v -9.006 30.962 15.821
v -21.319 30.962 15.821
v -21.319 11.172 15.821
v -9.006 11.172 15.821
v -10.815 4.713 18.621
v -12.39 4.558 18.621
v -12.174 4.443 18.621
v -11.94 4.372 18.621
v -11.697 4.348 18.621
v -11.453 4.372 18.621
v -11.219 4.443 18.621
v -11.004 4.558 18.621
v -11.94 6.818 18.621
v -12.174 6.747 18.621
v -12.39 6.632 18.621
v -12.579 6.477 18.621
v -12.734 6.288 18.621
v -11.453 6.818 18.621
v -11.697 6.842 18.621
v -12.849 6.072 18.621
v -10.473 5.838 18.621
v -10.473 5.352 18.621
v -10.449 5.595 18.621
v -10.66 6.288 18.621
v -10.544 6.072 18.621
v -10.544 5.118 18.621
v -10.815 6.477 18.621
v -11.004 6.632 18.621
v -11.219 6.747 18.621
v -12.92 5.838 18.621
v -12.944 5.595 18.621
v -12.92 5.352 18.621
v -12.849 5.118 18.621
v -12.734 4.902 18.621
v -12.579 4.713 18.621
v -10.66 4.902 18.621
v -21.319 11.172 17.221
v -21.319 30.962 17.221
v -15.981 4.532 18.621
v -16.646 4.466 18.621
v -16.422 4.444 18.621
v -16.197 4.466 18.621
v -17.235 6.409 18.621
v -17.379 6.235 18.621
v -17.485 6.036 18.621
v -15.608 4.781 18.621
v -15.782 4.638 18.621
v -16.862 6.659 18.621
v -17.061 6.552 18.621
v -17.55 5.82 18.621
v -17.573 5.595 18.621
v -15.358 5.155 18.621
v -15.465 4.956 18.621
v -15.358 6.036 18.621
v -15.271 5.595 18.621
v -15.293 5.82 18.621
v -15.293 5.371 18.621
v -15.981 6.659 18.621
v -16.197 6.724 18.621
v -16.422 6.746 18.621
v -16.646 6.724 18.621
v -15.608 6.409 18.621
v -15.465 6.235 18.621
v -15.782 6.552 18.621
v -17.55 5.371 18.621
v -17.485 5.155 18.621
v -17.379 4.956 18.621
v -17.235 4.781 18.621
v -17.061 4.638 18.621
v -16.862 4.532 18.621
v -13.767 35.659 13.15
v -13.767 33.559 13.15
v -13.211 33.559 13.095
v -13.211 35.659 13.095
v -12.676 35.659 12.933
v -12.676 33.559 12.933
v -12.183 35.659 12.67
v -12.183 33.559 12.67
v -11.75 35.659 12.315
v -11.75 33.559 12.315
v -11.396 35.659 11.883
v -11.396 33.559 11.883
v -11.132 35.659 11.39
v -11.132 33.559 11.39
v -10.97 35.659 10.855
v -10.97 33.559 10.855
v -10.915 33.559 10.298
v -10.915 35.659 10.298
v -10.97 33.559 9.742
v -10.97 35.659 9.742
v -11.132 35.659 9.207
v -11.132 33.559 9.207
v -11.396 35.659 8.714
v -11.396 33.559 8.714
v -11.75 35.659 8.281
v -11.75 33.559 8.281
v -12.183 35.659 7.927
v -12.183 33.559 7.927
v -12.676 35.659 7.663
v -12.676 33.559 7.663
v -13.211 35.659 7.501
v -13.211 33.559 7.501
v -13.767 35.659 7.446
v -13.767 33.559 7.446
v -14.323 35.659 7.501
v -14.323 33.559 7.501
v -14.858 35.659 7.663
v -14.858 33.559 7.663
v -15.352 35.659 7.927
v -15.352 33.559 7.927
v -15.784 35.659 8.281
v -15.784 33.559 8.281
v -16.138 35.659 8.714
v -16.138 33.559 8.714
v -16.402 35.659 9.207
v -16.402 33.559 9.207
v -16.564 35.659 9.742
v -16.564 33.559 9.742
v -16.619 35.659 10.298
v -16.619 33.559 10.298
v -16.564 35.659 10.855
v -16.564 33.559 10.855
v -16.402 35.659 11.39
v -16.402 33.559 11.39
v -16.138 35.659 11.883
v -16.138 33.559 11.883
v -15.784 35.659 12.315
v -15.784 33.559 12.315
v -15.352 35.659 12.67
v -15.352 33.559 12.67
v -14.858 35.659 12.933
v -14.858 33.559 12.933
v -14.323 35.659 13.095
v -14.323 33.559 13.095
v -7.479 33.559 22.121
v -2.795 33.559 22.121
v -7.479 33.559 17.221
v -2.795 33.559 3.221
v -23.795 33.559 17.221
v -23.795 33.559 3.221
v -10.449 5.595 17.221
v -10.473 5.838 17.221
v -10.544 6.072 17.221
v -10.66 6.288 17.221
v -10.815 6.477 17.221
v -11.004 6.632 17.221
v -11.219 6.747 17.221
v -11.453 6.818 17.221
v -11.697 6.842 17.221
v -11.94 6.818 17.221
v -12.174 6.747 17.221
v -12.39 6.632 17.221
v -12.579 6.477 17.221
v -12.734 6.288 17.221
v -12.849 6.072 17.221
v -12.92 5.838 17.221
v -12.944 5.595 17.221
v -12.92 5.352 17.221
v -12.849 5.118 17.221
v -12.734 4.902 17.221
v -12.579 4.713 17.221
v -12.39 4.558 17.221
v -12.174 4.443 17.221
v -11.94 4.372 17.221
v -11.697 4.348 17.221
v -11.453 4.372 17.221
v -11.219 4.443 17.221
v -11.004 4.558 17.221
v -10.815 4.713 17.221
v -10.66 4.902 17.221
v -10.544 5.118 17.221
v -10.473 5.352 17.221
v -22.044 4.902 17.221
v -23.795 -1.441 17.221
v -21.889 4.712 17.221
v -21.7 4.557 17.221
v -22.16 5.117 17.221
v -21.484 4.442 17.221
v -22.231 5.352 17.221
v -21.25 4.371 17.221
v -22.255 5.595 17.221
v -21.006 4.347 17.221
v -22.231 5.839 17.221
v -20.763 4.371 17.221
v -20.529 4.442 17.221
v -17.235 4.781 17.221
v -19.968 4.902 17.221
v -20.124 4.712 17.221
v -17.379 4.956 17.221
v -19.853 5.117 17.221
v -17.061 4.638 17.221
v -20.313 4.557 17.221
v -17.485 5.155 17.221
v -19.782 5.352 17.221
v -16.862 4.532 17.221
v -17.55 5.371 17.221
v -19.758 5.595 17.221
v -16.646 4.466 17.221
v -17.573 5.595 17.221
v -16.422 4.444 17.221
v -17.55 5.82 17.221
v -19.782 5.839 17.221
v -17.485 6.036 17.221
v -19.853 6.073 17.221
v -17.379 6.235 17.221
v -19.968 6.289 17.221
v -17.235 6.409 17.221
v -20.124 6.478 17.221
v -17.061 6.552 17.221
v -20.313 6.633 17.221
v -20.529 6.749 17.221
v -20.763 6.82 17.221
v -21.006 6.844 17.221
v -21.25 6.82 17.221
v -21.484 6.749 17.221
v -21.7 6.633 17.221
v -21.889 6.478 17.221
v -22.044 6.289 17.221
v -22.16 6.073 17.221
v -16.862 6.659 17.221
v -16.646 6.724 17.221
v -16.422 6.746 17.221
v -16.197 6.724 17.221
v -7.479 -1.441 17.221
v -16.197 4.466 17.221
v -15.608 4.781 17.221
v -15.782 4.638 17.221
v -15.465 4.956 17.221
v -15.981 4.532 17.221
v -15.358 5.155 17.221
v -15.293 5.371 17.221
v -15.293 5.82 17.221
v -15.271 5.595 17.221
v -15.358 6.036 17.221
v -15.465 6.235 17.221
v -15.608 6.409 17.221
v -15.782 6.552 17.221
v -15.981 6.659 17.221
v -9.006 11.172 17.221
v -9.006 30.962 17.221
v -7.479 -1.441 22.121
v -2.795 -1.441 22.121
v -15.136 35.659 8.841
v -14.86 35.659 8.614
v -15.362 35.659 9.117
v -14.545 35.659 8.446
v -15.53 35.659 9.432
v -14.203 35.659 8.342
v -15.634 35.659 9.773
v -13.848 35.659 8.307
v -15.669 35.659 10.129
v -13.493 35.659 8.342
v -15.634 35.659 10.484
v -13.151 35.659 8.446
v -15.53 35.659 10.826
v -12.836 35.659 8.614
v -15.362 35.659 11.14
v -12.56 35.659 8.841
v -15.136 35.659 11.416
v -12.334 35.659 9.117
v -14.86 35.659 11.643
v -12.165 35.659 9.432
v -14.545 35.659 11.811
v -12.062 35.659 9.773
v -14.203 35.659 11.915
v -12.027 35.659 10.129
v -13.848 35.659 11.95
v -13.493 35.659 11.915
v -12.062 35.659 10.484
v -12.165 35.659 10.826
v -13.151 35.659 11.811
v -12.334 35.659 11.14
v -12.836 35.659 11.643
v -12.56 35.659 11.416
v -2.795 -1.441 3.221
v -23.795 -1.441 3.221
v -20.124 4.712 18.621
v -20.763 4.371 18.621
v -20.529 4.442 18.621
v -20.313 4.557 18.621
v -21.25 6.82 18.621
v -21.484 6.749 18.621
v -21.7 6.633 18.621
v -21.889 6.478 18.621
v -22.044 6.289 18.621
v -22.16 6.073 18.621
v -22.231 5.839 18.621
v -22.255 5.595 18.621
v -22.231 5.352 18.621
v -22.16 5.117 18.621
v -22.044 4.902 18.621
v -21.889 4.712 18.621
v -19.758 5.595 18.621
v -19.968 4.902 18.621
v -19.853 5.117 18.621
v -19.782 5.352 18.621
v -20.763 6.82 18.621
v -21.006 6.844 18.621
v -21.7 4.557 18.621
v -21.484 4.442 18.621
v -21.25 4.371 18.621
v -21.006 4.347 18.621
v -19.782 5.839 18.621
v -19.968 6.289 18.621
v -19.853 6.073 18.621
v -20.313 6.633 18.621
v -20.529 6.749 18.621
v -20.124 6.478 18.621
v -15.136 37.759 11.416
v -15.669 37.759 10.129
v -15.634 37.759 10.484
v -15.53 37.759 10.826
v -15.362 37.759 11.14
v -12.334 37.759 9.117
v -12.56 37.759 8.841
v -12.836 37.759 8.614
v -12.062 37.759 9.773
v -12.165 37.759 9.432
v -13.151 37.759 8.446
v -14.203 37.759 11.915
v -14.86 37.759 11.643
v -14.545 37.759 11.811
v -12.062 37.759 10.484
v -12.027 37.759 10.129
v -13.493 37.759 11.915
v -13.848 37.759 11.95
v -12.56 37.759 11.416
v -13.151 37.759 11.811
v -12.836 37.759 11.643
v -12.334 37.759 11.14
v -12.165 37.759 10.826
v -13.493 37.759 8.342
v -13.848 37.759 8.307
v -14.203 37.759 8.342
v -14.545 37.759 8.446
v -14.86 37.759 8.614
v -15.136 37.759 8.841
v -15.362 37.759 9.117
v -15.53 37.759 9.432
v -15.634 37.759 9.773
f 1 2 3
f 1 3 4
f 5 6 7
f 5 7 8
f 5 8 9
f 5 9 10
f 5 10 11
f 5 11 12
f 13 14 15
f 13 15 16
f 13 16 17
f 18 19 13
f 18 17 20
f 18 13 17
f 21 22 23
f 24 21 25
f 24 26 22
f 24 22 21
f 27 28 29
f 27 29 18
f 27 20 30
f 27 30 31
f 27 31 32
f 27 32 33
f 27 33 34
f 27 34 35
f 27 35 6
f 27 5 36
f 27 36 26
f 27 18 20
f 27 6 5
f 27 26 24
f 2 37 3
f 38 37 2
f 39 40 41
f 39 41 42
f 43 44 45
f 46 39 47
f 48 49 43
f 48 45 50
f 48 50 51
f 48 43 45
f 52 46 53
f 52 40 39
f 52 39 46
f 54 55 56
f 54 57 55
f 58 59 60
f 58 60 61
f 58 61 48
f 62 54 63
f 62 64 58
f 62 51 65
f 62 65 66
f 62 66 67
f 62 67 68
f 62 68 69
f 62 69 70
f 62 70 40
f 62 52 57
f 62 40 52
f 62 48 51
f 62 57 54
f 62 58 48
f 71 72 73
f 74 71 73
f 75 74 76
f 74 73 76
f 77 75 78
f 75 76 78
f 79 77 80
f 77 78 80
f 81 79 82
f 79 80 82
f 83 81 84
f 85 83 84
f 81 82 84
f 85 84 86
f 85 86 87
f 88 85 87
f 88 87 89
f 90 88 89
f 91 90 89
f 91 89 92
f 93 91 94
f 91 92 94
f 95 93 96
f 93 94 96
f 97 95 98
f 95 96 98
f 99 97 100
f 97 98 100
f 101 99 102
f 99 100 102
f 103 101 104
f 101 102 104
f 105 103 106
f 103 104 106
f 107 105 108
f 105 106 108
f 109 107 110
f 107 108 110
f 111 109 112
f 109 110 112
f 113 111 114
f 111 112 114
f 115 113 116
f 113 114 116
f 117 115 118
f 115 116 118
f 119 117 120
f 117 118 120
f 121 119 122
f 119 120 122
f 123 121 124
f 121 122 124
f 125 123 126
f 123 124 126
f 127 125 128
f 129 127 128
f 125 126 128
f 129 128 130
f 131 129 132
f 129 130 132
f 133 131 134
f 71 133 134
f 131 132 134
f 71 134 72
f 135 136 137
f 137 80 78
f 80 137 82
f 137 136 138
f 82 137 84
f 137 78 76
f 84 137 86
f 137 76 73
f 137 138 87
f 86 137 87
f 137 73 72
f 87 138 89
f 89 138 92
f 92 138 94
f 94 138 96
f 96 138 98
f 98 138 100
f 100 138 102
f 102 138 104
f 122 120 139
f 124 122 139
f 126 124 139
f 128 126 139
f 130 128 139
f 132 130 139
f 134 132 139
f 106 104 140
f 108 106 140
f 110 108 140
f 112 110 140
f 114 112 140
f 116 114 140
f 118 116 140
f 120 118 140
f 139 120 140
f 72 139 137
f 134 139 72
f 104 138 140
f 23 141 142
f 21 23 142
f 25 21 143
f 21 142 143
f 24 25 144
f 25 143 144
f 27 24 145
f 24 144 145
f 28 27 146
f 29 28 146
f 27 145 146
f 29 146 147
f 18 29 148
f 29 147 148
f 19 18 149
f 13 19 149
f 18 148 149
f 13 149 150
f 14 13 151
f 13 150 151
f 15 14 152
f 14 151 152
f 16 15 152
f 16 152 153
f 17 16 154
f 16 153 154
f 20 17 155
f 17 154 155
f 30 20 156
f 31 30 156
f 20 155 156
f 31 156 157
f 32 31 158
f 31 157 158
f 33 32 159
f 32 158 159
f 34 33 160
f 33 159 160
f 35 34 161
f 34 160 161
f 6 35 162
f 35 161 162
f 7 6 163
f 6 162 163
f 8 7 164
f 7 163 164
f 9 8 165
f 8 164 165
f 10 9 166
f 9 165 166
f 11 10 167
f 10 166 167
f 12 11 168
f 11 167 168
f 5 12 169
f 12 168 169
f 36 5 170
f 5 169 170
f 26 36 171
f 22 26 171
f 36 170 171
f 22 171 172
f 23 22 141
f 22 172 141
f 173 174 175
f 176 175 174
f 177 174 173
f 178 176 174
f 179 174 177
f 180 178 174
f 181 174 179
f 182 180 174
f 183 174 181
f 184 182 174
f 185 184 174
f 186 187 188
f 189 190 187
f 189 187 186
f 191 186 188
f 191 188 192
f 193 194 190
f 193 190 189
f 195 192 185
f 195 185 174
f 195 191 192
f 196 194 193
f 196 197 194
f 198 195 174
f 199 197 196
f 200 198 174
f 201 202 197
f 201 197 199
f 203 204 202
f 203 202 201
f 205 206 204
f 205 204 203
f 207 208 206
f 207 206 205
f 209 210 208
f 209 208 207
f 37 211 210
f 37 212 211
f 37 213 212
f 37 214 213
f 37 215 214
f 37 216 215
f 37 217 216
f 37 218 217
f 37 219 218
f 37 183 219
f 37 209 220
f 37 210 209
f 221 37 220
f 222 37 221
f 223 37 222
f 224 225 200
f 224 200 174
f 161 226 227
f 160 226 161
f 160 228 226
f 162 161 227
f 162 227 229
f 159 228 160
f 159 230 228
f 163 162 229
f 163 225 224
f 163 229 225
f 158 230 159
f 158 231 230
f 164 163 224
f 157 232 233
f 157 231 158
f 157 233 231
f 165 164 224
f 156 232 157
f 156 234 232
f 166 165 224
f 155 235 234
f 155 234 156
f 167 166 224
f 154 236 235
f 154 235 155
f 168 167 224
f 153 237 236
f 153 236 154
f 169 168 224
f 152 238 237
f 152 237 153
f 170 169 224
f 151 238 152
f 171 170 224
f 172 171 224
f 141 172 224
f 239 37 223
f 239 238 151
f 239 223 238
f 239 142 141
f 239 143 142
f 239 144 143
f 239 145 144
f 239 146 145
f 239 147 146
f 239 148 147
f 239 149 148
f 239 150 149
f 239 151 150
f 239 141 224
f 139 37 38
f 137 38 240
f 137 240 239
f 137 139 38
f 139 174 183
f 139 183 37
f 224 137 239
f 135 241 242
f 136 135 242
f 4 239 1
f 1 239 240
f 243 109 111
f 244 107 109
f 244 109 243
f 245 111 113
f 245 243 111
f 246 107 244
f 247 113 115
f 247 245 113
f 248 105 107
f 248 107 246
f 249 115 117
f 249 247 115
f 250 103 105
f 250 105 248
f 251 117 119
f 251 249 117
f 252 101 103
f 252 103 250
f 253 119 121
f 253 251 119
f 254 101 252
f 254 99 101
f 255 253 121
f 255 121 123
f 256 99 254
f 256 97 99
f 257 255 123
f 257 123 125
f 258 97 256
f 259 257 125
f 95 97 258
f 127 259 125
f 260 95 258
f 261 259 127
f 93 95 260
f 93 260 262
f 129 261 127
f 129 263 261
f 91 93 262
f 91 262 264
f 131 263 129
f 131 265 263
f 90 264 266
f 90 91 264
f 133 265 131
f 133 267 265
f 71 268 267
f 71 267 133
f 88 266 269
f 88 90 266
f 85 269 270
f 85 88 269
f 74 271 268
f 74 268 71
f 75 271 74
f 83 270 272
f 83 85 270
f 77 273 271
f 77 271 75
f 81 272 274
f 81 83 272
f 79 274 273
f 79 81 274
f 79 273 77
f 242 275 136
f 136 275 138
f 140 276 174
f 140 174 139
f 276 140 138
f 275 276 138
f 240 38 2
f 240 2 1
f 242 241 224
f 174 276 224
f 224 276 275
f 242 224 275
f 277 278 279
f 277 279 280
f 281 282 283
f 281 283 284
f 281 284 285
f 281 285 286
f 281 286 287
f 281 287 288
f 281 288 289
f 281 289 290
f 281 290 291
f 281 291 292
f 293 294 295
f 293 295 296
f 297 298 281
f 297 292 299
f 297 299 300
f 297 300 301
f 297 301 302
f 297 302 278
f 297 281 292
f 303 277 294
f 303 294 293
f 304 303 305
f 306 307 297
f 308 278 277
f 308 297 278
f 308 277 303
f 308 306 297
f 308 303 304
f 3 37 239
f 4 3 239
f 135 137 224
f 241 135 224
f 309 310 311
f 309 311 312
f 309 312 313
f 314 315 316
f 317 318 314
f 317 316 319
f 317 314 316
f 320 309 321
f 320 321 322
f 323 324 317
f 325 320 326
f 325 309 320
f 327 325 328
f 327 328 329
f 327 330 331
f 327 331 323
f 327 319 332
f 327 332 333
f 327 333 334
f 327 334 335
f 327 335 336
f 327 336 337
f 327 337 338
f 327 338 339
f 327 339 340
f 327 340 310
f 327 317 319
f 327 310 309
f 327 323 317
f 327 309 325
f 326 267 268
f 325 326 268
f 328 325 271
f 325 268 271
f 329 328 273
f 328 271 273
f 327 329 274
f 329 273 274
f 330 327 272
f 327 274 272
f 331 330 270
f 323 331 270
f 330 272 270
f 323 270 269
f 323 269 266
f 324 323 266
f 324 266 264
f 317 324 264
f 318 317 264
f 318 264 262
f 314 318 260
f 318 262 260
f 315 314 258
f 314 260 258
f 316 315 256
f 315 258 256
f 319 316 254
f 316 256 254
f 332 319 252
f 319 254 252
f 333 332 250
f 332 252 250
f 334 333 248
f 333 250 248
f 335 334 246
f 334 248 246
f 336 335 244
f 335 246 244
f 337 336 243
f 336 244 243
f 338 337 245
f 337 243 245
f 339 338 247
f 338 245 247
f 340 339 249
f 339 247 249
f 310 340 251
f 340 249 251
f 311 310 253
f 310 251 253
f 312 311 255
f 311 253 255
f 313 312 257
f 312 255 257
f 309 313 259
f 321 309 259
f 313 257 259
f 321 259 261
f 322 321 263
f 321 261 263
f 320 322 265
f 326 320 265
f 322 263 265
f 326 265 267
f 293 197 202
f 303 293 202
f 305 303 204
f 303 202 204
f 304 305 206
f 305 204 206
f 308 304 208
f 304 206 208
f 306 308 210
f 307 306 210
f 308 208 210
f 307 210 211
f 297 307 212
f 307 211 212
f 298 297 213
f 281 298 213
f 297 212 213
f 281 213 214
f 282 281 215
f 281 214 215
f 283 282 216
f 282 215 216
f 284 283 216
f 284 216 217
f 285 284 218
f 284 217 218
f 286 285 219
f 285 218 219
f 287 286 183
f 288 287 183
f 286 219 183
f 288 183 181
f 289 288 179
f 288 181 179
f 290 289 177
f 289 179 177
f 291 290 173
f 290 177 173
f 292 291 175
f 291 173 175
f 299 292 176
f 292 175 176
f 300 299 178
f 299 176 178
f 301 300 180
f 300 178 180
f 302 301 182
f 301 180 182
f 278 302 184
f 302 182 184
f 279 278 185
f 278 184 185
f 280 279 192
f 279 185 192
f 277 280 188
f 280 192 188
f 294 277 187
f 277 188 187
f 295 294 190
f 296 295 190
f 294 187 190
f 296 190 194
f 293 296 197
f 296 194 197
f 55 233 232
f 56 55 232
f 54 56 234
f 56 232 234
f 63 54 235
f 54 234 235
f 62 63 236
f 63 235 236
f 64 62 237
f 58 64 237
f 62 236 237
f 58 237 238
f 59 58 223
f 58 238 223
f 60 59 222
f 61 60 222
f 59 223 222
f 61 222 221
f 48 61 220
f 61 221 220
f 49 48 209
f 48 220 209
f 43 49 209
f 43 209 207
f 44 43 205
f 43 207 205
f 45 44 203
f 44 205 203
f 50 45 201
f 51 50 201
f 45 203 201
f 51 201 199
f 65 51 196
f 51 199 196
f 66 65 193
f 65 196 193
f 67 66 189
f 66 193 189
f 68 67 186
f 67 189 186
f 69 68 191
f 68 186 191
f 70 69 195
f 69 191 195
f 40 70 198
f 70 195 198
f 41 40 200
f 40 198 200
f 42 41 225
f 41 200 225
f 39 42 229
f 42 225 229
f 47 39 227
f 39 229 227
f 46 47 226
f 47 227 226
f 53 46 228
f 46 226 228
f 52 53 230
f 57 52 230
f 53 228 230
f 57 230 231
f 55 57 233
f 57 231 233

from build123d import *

# Parameters (mm, degrees)
SKETCH1_W           = 30
SKETCH1_H           = 50
BOSS_EXTRUDE1_DEPTH = 20
SKETCH2_W           = 17.590174706
SKETCH2_H           = 28.27201044
CUT_EXTRUDE1_DEPTH  = 2
BOSS_EXTRUDE2_DEPTH = 7
SKETCH4_R           = 1.783397986
SKETCH4_R_2         = 1.644242452
SKETCH4_R_3         = 1.78177715
BOSS_EXTRUDE3_DEPTH = 2
SKETCH5_R           = 4.074369341
BOSS_EXTRUDE4_DEPTH = 3
SKETCH6_R           = 2.60170509
BOSS_EXTRUDE5_DEPTH = 3
SCALE1_SCALE        = 0.7


with BuildPart() as part:
    # Sketch1 → Boss-Extrude1 (new body)
    with BuildSketch(Plane.XY):
        with Locations((-13.575598108, 16.077578101)):
            Rectangle(SKETCH1_W, SKETCH1_H)
    extrude(amount=BOSS_EXTRUDE1_DEPTH)

    # Sketch2 → Cut-Extrude1 (cut)
    with BuildSketch(Plane.XY.offset(20)):
        with Locations((-16.242560835, 23.231182823)):
            Rectangle(SKETCH2_W, SKETCH2_H)
    extrude(amount=-CUT_EXTRUDE1_DEPTH, mode=Mode.SUBTRACT)

    # Sketch3 → Boss-Extrude2 (add)
    with BuildSketch(Plane.XY.offset(20)):
        Polygon((-4.548684079, 41.077578101), (-5.266390414, 41.077578101), (-5.266390414, -8.922421899), (1.424401892, -8.922421899), (1.424401892, 41.077578101), align=None)
    extrude(amount=BOSS_EXTRUDE2_DEPTH)

    # Sketch4 → Boss-Extrude3 (add)
    with BuildSketch(Plane.XY.offset(20)):
        with Locations((-24.591340484, 1.128947628)):
            Circle(SKETCH4_R)
        with Locations((-18.041639174, 1.128947628)):
            Circle(SKETCH4_R_2)
        with Locations((-11.291658509, 1.128947628)):
            Circle(SKETCH4_R_3)
    extrude(amount=BOSS_EXTRUDE3_DEPTH)

    # Sketch5 → Boss-Extrude4 (add)
    with BuildSketch(Plane(origin=(0, 41.077578101, 0), x_dir=(1, 0, 0), z_dir=(0, 1, 0))):
        with Locations(Location((-14.24940876, -10.110216384, 0), (0, 0, 270))):
            Circle(SKETCH5_R)
    extrude(amount=BOSS_EXTRUDE4_DEPTH)

    # Sketch6 → Boss-Extrude5 (add)
    with BuildSketch(Plane(origin=(0, 44.077578101, 0), x_dir=(1, 0, 0), z_dir=(0, 1, 0))):
        with Locations(Location((-14.364915038, -9.868044196, 0), (0, 0, 270))):
            Circle(SKETCH6_R)
    extrude(amount=BOSS_EXTRUDE5_DEPTH)


with BuildPart() as part_1:
    # Scale1: scaled about (-12.641542426, 16.016298643, 10.736690586)
    add(part.part.scale(SCALE1_SCALE).moved(Location((-3.792462728, 4.804889593, 3.221007176))))


solid = part_1.part
